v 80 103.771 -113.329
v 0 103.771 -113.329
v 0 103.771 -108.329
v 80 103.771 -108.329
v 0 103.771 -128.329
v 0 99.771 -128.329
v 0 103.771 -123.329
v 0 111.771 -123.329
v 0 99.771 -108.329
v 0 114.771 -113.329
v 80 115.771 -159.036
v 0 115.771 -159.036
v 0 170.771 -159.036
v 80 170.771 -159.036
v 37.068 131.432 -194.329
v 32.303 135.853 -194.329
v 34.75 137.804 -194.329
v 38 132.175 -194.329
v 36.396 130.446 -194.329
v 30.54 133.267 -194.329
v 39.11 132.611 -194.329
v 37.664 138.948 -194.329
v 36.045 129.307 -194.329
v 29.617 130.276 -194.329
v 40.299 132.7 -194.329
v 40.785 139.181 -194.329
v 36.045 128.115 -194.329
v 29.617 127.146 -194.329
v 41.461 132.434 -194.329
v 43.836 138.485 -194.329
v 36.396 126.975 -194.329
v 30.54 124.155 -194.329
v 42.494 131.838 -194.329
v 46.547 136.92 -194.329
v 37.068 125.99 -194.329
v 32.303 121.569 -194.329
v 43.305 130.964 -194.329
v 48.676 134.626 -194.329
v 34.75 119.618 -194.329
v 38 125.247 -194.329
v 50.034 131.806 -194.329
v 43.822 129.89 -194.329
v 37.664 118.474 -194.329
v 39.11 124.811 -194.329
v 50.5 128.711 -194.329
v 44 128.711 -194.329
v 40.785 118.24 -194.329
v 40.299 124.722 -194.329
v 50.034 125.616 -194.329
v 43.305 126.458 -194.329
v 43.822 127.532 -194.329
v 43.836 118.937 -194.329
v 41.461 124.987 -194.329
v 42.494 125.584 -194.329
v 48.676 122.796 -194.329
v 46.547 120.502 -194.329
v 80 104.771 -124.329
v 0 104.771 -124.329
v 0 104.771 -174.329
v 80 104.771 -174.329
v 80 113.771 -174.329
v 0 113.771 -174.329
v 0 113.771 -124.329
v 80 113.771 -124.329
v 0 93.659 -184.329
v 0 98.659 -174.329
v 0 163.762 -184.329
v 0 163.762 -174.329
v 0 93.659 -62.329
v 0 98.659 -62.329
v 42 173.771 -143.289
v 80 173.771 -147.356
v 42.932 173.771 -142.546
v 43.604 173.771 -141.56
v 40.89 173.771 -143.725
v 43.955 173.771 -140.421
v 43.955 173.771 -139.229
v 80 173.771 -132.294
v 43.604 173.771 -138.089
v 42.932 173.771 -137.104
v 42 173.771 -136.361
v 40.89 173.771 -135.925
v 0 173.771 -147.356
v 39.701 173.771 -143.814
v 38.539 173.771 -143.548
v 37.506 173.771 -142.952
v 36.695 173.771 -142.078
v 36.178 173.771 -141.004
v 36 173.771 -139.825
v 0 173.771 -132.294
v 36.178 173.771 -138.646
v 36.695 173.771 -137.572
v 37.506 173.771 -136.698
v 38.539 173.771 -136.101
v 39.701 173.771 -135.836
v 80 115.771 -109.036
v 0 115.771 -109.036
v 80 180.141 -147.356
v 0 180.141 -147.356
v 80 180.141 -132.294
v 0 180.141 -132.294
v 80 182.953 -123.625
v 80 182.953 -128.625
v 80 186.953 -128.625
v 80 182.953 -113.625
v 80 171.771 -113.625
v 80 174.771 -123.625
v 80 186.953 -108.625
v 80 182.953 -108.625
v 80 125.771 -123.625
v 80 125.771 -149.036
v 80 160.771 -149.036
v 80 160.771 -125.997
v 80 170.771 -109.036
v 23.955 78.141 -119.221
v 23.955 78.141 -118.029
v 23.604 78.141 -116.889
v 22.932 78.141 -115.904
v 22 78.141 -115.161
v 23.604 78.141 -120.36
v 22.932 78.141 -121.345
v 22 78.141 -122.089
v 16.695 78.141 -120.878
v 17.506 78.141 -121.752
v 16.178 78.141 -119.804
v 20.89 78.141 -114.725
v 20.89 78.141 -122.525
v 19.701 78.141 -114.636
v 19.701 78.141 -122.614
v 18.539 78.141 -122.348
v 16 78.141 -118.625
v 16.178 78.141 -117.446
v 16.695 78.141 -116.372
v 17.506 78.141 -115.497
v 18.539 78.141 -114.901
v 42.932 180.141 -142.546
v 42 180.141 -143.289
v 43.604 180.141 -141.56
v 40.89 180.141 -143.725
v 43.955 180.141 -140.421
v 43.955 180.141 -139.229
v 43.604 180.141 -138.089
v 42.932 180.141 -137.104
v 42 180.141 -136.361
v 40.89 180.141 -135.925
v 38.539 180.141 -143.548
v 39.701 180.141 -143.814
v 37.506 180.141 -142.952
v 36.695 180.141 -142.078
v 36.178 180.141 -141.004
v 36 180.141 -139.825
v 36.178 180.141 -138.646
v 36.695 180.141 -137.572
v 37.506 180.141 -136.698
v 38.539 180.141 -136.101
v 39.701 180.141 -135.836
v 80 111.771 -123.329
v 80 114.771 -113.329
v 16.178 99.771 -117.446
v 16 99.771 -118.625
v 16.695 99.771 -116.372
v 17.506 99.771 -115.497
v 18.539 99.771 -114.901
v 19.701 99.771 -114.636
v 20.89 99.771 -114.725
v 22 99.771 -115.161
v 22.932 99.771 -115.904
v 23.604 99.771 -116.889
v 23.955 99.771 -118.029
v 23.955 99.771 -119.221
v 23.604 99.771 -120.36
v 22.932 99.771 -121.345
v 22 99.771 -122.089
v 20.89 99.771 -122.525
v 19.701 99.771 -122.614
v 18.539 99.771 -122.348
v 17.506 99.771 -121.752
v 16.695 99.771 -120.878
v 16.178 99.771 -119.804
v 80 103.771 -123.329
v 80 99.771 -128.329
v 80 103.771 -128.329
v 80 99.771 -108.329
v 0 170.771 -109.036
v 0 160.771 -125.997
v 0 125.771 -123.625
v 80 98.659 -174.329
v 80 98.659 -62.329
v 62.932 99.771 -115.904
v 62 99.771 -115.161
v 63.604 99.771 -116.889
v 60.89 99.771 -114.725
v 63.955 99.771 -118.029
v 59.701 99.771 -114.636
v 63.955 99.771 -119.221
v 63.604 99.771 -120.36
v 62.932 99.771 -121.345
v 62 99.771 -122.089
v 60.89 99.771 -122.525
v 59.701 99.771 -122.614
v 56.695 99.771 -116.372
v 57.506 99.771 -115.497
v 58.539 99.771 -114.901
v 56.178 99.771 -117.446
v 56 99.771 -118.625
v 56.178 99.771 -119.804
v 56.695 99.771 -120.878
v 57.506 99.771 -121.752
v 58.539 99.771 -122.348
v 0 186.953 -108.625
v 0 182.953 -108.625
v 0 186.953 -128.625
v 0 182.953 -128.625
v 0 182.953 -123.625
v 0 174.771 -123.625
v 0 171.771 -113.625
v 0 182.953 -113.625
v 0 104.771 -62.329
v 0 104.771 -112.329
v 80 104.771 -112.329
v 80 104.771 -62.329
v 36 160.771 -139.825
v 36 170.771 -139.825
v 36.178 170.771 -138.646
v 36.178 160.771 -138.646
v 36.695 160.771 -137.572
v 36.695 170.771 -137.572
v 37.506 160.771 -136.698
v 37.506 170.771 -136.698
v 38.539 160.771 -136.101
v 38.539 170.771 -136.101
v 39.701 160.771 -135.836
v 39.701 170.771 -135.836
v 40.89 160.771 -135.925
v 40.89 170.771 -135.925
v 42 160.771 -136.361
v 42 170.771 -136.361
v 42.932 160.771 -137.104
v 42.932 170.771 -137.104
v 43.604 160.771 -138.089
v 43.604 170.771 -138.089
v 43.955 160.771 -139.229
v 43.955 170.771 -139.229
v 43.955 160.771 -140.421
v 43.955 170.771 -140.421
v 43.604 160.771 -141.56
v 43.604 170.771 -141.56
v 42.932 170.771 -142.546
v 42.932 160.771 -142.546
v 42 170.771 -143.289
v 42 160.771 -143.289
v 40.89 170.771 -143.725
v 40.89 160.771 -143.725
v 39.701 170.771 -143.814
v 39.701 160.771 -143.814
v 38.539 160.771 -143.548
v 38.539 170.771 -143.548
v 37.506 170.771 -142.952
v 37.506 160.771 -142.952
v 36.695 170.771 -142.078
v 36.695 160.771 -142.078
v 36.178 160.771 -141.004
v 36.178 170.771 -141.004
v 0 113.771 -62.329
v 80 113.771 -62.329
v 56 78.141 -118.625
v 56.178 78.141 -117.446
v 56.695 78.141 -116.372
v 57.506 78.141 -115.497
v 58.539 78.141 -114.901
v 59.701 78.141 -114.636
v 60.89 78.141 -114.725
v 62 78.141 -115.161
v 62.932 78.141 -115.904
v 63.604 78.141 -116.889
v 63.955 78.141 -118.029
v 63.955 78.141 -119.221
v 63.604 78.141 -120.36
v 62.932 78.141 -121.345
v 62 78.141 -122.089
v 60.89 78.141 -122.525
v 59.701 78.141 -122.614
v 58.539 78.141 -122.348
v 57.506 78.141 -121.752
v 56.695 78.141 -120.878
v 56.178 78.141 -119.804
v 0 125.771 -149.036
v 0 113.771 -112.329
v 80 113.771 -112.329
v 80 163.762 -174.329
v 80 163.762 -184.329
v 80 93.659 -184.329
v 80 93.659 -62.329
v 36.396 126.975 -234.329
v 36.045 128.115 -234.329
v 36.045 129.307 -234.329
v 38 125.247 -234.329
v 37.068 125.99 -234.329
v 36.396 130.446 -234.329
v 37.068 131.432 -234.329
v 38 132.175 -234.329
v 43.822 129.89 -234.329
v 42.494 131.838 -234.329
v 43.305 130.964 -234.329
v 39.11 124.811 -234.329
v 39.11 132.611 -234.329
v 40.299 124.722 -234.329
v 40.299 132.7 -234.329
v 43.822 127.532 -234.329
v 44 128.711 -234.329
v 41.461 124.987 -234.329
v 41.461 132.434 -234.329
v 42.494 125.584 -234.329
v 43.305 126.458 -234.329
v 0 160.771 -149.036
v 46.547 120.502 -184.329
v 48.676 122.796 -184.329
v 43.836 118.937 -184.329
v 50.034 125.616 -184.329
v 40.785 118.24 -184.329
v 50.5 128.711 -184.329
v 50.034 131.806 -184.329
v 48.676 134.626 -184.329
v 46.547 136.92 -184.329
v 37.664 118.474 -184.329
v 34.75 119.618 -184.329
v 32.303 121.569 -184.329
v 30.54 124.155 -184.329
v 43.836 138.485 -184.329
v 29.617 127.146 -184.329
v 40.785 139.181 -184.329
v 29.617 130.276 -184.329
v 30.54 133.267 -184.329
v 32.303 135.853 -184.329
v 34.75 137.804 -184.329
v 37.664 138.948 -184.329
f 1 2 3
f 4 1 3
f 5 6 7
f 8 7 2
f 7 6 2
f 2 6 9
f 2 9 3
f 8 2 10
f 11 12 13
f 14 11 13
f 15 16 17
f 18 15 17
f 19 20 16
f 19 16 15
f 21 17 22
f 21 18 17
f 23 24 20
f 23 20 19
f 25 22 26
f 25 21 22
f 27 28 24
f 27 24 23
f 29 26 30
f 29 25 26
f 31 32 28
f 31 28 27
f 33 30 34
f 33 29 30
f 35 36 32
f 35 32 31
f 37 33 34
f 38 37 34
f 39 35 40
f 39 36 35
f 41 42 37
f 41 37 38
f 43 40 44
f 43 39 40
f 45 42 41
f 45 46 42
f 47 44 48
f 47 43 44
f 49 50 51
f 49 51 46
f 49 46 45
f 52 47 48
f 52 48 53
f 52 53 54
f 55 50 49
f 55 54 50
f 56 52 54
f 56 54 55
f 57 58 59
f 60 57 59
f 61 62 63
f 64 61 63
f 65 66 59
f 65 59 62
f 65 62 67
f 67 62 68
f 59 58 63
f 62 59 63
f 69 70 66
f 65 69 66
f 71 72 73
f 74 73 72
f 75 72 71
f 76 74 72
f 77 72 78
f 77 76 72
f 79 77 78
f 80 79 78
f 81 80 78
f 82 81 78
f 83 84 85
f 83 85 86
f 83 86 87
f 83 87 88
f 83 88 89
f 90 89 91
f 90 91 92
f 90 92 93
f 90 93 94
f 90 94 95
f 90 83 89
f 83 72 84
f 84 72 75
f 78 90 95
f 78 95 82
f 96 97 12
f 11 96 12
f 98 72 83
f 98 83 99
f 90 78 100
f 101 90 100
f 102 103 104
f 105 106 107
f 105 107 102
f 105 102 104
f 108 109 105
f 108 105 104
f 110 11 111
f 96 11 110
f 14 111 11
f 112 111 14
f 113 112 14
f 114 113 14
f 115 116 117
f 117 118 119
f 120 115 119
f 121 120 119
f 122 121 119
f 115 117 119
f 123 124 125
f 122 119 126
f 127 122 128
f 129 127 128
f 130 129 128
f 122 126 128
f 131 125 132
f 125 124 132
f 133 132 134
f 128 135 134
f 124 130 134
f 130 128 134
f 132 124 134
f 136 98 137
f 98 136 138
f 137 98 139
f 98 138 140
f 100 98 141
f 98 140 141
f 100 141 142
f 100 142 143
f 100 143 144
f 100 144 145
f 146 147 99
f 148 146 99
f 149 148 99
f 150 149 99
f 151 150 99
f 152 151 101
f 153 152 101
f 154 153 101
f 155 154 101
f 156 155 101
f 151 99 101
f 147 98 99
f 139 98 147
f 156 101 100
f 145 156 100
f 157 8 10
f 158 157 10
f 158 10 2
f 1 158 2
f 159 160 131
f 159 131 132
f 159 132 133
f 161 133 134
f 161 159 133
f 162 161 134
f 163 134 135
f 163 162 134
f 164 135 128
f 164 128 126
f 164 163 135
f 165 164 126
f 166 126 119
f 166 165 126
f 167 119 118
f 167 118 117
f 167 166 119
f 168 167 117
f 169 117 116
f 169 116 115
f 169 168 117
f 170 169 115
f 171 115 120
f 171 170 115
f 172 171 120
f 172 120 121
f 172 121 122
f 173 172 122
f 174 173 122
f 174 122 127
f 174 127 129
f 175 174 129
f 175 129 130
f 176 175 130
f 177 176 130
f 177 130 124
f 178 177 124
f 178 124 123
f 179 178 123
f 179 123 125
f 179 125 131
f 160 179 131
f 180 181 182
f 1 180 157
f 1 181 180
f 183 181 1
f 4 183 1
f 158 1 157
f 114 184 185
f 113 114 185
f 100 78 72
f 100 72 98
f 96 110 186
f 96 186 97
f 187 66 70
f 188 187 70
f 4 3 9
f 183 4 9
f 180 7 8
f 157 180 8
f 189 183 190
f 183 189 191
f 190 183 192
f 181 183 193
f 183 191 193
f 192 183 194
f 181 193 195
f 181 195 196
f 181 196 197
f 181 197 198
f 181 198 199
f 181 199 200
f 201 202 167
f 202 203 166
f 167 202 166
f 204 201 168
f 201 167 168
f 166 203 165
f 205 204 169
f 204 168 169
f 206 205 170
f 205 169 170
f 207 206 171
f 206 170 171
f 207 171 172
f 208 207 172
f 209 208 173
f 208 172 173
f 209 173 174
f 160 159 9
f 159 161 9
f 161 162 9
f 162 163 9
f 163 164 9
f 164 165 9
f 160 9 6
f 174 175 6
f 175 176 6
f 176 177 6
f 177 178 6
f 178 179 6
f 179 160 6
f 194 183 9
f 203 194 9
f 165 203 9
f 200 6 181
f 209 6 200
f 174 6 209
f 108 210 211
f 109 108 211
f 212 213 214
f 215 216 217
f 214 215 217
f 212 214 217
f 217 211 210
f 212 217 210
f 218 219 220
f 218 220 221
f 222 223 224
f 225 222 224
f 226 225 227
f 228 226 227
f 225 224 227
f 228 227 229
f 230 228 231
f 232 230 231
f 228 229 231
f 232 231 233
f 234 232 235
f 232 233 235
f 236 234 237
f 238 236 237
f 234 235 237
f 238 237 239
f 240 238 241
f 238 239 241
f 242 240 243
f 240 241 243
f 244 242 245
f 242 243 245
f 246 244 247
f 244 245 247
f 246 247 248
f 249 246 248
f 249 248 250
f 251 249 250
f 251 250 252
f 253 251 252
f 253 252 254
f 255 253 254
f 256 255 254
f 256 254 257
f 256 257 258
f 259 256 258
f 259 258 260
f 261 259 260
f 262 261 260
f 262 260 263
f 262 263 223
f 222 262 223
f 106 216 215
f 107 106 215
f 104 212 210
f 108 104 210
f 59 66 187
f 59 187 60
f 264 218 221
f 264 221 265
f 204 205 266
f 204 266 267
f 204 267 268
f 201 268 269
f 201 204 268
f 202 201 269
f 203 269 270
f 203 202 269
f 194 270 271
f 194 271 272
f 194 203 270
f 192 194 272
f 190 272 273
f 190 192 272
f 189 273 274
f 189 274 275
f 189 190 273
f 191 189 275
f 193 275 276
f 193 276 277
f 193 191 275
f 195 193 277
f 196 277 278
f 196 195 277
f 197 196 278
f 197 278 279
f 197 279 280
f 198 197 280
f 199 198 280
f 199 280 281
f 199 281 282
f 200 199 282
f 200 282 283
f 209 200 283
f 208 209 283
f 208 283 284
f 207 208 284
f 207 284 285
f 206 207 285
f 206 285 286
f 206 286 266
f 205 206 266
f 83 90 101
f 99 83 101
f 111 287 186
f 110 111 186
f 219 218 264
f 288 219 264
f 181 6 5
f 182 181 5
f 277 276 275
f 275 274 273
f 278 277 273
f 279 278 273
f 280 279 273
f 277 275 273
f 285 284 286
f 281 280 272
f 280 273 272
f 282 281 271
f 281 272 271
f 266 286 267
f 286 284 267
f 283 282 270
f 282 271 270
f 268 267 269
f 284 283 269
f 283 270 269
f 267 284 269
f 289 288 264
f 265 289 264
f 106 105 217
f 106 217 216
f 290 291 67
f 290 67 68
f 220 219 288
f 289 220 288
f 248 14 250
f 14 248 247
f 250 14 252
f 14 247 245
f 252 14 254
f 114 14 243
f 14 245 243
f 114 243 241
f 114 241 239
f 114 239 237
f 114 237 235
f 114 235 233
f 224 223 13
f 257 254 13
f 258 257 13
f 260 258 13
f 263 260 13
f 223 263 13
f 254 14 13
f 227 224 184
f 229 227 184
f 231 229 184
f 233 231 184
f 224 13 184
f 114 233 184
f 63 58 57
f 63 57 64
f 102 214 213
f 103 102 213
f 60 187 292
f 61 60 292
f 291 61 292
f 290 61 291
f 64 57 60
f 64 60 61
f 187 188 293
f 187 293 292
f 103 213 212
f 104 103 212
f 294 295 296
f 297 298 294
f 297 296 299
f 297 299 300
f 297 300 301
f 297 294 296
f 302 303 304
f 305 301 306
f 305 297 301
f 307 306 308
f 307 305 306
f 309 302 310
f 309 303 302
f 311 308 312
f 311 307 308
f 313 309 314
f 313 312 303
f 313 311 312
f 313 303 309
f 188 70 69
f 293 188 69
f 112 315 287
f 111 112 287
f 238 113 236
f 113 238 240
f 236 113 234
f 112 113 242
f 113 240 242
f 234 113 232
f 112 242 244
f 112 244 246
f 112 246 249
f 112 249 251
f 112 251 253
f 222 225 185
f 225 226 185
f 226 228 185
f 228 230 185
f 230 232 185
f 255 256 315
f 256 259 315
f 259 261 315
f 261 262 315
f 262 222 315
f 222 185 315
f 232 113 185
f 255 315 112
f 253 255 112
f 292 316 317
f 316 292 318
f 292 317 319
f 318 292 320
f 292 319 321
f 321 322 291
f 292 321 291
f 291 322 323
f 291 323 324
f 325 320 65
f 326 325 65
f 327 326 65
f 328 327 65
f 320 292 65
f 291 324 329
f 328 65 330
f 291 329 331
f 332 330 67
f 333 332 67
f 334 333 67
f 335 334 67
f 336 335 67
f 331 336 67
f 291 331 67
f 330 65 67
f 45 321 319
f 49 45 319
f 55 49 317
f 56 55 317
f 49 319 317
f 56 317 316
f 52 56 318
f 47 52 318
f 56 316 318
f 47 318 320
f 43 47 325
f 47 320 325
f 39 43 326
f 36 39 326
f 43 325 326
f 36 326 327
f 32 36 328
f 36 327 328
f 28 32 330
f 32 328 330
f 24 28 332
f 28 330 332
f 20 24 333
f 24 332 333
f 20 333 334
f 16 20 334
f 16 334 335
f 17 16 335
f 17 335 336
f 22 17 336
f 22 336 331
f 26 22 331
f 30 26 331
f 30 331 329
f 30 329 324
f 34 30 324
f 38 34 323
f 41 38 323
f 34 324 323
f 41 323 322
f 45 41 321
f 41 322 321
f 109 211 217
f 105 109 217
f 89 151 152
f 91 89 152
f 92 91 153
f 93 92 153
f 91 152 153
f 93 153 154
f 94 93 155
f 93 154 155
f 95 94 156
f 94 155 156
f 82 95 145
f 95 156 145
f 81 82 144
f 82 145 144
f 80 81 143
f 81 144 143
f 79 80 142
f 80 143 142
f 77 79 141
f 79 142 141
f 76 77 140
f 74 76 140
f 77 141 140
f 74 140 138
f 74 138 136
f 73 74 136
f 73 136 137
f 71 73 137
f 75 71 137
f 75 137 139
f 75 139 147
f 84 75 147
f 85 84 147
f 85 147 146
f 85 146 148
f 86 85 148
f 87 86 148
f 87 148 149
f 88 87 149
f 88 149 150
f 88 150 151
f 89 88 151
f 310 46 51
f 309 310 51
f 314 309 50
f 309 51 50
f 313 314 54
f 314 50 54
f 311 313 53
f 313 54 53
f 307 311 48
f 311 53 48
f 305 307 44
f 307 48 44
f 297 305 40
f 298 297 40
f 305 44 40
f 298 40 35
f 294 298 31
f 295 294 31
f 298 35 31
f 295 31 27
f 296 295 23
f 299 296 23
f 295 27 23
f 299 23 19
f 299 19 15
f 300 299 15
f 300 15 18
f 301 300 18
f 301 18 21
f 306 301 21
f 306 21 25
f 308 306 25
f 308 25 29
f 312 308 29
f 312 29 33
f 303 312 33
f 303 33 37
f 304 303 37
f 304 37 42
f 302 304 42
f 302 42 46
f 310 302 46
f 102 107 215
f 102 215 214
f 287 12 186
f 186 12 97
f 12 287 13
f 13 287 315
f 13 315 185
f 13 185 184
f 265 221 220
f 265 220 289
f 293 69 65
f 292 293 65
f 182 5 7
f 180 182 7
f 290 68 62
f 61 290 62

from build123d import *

# Parameters (mm, degrees)
F1_DEPTH = 80
F0_W     = 9
F0_H     = 50
F0_W_2   = 6.1117671594
F0_H_2   = 10
F0_W_3   = 6.3699182272
F0_H_3   = 15.0621980429
F2_R     = 4
F4_DEPTH = 36.3
F5_START = -111
F5_DEPTH = 89
F6_START = -80
F6_DEPTH = 22
F7_R     = 4
F8_DEPTH = 50
F7_R_2   = 10.5
F9_DEPTH = 10


# Not quite as in the source:
# - a feature of the source that left no trace in its solid (it failed there, or was rolled back) is left out


with BuildPart() as f1:
    # F0 (on Right) → F1 (new body)
    with BuildSketch(Plane.YZ):
        Polygon((115.7712601885, -159.0363204131), (160.7712601885, -159.0363204131), (160.7712601885, -149.0363204131), (125.7712601885, -149.0363204131), (115.7712601885, -149.0363204131), align=None)
        Polygon((115.7712601885, -149.0363204131), (125.7712601885, -149.0363204131), (125.7712601885, -123.6247909078), (115.7712601885, -109.0363204131), align=None)
        Polygon((170.7712601885, -159.0363204131), (170.7712601885, -109.0363204131), (160.7712601885, -125.9965002537), (160.7712601885, -149.0363204131), (160.7712601885, -159.0363204131), align=None)
    extrude(amount=F1_DEPTH)


with BuildPart() as f1b:
    # F0 (on Right) → F1, piece 2 (new body)
    with BuildSketch(Plane.YZ):
        with Locations((109.2712601885, -87.3286305666)):
            Rectangle(F0_W, F0_H)
    extrude(amount=F1_DEPTH)


with BuildPart() as f1c:
    # F0 (on Right) → F1, piece 3 (new body)
    with BuildSketch(Plane.YZ):
        Polygon((103.7712601885, -128.3286305666), (103.7712601885, -123.3286305666), (111.7712601885, -123.3286305666), (114.7712601885, -113.3286305666), (103.7712601885, -113.3286305666), (103.7712601885, -108.3286305666), (99.7712601885, -108.3286305666), (99.7712601885, -128.3286305666), align=None)
    extrude(amount=F1_DEPTH)

    # F2 (on face) → F6 (join)
    with BuildSketch(Plane(origin=(0, 180.1411784157, 0), x_dir=(-1, 0, 0), z_dir=(0, 1, 0)).offset(F6_START)):
        with Locations((-60, -118.6247909078)):
            Circle(F2_R)
        with Locations((-20, -118.6247909078)):
            Circle(F2_R)
    extrude(amount=-F6_DEPTH)


with BuildPart() as f1d:
    # F0 (on Right) → F1, piece 4 (new body)
    with BuildSketch(Plane.YZ):
        with Locations((109.2712601885, -149.3286305666)):
            Rectangle(F0_W, F0_H)
        Polygon((163.7621800169, -174.3286305666), (113.7712601885, -174.3286305666), (104.7712601885, -174.3286305666), (104.7712601885, -184.3286305666), (163.7621800169, -184.3286305666), align=None)
        Polygon((98.6594930291, -184.3286305666), (98.6594930291, -174.3286305666), (98.6594930291, -62.3286305666), (93.6594930291, -62.3286305666), (93.6594930291, -184.3286305666), align=None)
        with Locations((101.7153766088, -179.3286305666)):
            Rectangle(F0_W_2, F0_H_2)
    extrude(amount=F1_DEPTH)

    # F7 (on face) → F8 (join)
    with BuildSketch(Plane(origin=(0, 0, -184.3286305666), x_dir=(1, 0, 0), z_dir=(0, 0, -1))):
        with Locations((40, -128.710836523)):
            Circle(F7_R)
    extrude(amount=F8_DEPTH)

    # F7 (on face) → F9 (join)
    with BuildSketch(Plane(origin=(0, 0, -184.3286305666), x_dir=(1, 0, 0), z_dir=(0, 0, -1))):
        with Locations((40, -128.710836523)):
            Circle(F7_R_2)
        with Locations((40, -128.710836523)):
            Circle(F7_R, mode=Mode.SUBTRACT)
        with Locations((40, -128.710836523)):
            Circle(F7_R)
    extrude(amount=F9_DEPTH)


with BuildPart() as f1e:
    # F0 (on Right) → F1, piece 5 (new body)
    with BuildSketch(Plane.YZ):
        Polygon((186.9528900847, -128.6247909078), (186.9528900847, -108.6247909078), (182.9528900847, -108.6247909078), (182.9528900847, -113.6247909078), (171.7712601885, -113.6247909078), (174.7712601885, -123.6247909078), (182.9528900847, -123.6247909078), (182.9528900847, -128.6247909078), align=None)
    extrude(amount=F1_DEPTH)


with BuildPart() as f1f:
    # F0 (on Right) → F1, piece 6 (new body)
    with BuildSketch(Plane.YZ):
        with Locations((176.9562193021, -139.8249312887)):
            Rectangle(F0_W_3, F0_H_3)
    extrude(amount=F1_DEPTH)


with BuildPart() as f4_tool:
    # F2 (on face) → F4 (new body)
    with BuildSketch(Plane(origin=(0, 180.1411784157, 0), x_dir=(-1, 0, 0), z_dir=(0, 1, 0))):
        with Locations((-40, -139.8249312887)):
            Circle(F2_R)
    extrude(amount=-F4_DEPTH)


with BuildPart() as f1_1:
    add(f1.part)

    # F4: cut by f4_tool
    add(f4_tool.part, mode=Mode.SUBTRACT)

    # F2 (on face) → F5 (cut)
    with BuildSketch(Plane(origin=(0, 180.1411784157, 0), x_dir=(-1, 0, 0), z_dir=(0, 1, 0)).offset(F5_START)):
        with Locations((-60, -118.6247909078)):
            Circle(F2_R)
        with Locations((-20, -118.6247909078)):
            Circle(F2_R)
    extrude(amount=-F5_DEPTH, mode=Mode.SUBTRACT)


with BuildPart() as f1f_1:
    add(f1f.part)

    # F4: cut by f4_tool
    add(f4_tool.part, mode=Mode.SUBTRACT)


solid = Compound([f1b.part, f1c.part, f1d.part, f1e.part, f1_1.part, f1f_1.part])
